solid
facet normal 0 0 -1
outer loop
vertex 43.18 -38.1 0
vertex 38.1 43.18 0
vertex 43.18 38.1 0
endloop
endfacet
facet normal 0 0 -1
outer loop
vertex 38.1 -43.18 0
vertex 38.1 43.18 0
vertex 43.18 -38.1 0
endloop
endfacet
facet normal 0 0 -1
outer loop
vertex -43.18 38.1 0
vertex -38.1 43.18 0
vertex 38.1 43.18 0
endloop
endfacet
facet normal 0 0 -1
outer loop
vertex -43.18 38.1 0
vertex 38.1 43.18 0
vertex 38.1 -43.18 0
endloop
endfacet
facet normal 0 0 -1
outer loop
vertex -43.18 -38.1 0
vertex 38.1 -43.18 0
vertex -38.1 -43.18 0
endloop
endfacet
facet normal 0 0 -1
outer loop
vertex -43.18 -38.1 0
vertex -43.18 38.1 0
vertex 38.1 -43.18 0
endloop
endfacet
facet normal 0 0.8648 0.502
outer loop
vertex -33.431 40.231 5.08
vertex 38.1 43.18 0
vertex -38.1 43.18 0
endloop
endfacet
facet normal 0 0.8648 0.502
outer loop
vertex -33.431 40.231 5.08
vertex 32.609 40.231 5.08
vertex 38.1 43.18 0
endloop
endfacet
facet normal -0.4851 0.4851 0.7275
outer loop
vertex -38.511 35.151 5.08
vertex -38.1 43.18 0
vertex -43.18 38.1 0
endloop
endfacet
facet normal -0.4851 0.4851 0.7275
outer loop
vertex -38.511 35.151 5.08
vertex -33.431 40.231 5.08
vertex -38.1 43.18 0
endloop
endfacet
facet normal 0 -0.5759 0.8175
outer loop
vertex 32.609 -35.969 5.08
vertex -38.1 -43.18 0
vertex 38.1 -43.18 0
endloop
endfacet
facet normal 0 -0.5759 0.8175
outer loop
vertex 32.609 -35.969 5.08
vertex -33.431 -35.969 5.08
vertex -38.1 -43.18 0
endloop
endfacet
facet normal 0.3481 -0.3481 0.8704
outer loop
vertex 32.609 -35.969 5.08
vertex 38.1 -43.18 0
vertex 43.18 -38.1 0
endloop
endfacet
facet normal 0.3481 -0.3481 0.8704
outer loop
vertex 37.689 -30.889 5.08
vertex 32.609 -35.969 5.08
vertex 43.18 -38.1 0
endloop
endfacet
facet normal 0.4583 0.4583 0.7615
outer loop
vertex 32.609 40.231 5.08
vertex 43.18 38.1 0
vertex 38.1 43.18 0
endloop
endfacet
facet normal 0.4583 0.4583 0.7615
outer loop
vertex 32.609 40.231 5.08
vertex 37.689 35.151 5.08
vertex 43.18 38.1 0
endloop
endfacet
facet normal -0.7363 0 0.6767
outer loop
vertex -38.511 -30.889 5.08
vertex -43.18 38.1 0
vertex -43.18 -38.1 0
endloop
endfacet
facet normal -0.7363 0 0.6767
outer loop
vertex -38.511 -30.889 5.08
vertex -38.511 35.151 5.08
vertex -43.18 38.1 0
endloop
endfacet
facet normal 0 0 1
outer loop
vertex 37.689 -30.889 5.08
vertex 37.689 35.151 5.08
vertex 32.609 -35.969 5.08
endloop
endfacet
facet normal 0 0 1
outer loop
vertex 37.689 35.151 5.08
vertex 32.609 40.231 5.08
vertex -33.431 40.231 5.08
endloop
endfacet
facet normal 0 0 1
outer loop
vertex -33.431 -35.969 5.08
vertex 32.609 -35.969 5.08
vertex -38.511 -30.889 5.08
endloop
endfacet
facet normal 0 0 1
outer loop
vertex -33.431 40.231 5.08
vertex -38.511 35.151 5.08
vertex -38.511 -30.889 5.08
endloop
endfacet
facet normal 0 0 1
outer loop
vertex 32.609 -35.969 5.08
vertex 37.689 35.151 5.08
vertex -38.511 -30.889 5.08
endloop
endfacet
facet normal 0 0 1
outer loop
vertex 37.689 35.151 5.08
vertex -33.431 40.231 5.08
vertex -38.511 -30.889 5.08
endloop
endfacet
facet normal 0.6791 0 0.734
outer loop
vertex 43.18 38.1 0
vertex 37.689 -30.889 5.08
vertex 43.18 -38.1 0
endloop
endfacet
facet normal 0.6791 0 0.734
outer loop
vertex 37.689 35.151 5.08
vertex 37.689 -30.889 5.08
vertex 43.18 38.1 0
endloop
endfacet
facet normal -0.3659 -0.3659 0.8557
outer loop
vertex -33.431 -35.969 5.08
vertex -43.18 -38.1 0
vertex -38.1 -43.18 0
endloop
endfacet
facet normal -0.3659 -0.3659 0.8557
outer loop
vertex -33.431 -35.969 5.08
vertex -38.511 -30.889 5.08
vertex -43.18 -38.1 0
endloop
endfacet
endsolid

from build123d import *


with BuildPart() as f3:
    # F0 (on Top) → F3 section 0
    with BuildSketch(Plane.XY):
        Polygon((38.1, 43.18), (-38.1, 43.18), (-43.18, 38.1), (-43.18, -38.1), (-38.1, -43.18), (38.1, -43.18), (43.18, -38.1), (43.18, 38.1), align=None)
    # F2 (on offset) → F3 section 1
    with BuildSketch(Plane.XY.offset(5.08)):
        Polygon((-33.4306955338, 40.2305973589), (-38.5106955338, 35.1505973589), (-38.5106955338, -30.8894026411), (-33.4306955338, -35.9694026411), (32.6093044662, -35.9694026411), (37.6893044662, -30.8894026411), (37.6893044662, 35.1505973589), (32.6093044662, 40.2305973589), align=None)
    loft()


solid = f3.part
